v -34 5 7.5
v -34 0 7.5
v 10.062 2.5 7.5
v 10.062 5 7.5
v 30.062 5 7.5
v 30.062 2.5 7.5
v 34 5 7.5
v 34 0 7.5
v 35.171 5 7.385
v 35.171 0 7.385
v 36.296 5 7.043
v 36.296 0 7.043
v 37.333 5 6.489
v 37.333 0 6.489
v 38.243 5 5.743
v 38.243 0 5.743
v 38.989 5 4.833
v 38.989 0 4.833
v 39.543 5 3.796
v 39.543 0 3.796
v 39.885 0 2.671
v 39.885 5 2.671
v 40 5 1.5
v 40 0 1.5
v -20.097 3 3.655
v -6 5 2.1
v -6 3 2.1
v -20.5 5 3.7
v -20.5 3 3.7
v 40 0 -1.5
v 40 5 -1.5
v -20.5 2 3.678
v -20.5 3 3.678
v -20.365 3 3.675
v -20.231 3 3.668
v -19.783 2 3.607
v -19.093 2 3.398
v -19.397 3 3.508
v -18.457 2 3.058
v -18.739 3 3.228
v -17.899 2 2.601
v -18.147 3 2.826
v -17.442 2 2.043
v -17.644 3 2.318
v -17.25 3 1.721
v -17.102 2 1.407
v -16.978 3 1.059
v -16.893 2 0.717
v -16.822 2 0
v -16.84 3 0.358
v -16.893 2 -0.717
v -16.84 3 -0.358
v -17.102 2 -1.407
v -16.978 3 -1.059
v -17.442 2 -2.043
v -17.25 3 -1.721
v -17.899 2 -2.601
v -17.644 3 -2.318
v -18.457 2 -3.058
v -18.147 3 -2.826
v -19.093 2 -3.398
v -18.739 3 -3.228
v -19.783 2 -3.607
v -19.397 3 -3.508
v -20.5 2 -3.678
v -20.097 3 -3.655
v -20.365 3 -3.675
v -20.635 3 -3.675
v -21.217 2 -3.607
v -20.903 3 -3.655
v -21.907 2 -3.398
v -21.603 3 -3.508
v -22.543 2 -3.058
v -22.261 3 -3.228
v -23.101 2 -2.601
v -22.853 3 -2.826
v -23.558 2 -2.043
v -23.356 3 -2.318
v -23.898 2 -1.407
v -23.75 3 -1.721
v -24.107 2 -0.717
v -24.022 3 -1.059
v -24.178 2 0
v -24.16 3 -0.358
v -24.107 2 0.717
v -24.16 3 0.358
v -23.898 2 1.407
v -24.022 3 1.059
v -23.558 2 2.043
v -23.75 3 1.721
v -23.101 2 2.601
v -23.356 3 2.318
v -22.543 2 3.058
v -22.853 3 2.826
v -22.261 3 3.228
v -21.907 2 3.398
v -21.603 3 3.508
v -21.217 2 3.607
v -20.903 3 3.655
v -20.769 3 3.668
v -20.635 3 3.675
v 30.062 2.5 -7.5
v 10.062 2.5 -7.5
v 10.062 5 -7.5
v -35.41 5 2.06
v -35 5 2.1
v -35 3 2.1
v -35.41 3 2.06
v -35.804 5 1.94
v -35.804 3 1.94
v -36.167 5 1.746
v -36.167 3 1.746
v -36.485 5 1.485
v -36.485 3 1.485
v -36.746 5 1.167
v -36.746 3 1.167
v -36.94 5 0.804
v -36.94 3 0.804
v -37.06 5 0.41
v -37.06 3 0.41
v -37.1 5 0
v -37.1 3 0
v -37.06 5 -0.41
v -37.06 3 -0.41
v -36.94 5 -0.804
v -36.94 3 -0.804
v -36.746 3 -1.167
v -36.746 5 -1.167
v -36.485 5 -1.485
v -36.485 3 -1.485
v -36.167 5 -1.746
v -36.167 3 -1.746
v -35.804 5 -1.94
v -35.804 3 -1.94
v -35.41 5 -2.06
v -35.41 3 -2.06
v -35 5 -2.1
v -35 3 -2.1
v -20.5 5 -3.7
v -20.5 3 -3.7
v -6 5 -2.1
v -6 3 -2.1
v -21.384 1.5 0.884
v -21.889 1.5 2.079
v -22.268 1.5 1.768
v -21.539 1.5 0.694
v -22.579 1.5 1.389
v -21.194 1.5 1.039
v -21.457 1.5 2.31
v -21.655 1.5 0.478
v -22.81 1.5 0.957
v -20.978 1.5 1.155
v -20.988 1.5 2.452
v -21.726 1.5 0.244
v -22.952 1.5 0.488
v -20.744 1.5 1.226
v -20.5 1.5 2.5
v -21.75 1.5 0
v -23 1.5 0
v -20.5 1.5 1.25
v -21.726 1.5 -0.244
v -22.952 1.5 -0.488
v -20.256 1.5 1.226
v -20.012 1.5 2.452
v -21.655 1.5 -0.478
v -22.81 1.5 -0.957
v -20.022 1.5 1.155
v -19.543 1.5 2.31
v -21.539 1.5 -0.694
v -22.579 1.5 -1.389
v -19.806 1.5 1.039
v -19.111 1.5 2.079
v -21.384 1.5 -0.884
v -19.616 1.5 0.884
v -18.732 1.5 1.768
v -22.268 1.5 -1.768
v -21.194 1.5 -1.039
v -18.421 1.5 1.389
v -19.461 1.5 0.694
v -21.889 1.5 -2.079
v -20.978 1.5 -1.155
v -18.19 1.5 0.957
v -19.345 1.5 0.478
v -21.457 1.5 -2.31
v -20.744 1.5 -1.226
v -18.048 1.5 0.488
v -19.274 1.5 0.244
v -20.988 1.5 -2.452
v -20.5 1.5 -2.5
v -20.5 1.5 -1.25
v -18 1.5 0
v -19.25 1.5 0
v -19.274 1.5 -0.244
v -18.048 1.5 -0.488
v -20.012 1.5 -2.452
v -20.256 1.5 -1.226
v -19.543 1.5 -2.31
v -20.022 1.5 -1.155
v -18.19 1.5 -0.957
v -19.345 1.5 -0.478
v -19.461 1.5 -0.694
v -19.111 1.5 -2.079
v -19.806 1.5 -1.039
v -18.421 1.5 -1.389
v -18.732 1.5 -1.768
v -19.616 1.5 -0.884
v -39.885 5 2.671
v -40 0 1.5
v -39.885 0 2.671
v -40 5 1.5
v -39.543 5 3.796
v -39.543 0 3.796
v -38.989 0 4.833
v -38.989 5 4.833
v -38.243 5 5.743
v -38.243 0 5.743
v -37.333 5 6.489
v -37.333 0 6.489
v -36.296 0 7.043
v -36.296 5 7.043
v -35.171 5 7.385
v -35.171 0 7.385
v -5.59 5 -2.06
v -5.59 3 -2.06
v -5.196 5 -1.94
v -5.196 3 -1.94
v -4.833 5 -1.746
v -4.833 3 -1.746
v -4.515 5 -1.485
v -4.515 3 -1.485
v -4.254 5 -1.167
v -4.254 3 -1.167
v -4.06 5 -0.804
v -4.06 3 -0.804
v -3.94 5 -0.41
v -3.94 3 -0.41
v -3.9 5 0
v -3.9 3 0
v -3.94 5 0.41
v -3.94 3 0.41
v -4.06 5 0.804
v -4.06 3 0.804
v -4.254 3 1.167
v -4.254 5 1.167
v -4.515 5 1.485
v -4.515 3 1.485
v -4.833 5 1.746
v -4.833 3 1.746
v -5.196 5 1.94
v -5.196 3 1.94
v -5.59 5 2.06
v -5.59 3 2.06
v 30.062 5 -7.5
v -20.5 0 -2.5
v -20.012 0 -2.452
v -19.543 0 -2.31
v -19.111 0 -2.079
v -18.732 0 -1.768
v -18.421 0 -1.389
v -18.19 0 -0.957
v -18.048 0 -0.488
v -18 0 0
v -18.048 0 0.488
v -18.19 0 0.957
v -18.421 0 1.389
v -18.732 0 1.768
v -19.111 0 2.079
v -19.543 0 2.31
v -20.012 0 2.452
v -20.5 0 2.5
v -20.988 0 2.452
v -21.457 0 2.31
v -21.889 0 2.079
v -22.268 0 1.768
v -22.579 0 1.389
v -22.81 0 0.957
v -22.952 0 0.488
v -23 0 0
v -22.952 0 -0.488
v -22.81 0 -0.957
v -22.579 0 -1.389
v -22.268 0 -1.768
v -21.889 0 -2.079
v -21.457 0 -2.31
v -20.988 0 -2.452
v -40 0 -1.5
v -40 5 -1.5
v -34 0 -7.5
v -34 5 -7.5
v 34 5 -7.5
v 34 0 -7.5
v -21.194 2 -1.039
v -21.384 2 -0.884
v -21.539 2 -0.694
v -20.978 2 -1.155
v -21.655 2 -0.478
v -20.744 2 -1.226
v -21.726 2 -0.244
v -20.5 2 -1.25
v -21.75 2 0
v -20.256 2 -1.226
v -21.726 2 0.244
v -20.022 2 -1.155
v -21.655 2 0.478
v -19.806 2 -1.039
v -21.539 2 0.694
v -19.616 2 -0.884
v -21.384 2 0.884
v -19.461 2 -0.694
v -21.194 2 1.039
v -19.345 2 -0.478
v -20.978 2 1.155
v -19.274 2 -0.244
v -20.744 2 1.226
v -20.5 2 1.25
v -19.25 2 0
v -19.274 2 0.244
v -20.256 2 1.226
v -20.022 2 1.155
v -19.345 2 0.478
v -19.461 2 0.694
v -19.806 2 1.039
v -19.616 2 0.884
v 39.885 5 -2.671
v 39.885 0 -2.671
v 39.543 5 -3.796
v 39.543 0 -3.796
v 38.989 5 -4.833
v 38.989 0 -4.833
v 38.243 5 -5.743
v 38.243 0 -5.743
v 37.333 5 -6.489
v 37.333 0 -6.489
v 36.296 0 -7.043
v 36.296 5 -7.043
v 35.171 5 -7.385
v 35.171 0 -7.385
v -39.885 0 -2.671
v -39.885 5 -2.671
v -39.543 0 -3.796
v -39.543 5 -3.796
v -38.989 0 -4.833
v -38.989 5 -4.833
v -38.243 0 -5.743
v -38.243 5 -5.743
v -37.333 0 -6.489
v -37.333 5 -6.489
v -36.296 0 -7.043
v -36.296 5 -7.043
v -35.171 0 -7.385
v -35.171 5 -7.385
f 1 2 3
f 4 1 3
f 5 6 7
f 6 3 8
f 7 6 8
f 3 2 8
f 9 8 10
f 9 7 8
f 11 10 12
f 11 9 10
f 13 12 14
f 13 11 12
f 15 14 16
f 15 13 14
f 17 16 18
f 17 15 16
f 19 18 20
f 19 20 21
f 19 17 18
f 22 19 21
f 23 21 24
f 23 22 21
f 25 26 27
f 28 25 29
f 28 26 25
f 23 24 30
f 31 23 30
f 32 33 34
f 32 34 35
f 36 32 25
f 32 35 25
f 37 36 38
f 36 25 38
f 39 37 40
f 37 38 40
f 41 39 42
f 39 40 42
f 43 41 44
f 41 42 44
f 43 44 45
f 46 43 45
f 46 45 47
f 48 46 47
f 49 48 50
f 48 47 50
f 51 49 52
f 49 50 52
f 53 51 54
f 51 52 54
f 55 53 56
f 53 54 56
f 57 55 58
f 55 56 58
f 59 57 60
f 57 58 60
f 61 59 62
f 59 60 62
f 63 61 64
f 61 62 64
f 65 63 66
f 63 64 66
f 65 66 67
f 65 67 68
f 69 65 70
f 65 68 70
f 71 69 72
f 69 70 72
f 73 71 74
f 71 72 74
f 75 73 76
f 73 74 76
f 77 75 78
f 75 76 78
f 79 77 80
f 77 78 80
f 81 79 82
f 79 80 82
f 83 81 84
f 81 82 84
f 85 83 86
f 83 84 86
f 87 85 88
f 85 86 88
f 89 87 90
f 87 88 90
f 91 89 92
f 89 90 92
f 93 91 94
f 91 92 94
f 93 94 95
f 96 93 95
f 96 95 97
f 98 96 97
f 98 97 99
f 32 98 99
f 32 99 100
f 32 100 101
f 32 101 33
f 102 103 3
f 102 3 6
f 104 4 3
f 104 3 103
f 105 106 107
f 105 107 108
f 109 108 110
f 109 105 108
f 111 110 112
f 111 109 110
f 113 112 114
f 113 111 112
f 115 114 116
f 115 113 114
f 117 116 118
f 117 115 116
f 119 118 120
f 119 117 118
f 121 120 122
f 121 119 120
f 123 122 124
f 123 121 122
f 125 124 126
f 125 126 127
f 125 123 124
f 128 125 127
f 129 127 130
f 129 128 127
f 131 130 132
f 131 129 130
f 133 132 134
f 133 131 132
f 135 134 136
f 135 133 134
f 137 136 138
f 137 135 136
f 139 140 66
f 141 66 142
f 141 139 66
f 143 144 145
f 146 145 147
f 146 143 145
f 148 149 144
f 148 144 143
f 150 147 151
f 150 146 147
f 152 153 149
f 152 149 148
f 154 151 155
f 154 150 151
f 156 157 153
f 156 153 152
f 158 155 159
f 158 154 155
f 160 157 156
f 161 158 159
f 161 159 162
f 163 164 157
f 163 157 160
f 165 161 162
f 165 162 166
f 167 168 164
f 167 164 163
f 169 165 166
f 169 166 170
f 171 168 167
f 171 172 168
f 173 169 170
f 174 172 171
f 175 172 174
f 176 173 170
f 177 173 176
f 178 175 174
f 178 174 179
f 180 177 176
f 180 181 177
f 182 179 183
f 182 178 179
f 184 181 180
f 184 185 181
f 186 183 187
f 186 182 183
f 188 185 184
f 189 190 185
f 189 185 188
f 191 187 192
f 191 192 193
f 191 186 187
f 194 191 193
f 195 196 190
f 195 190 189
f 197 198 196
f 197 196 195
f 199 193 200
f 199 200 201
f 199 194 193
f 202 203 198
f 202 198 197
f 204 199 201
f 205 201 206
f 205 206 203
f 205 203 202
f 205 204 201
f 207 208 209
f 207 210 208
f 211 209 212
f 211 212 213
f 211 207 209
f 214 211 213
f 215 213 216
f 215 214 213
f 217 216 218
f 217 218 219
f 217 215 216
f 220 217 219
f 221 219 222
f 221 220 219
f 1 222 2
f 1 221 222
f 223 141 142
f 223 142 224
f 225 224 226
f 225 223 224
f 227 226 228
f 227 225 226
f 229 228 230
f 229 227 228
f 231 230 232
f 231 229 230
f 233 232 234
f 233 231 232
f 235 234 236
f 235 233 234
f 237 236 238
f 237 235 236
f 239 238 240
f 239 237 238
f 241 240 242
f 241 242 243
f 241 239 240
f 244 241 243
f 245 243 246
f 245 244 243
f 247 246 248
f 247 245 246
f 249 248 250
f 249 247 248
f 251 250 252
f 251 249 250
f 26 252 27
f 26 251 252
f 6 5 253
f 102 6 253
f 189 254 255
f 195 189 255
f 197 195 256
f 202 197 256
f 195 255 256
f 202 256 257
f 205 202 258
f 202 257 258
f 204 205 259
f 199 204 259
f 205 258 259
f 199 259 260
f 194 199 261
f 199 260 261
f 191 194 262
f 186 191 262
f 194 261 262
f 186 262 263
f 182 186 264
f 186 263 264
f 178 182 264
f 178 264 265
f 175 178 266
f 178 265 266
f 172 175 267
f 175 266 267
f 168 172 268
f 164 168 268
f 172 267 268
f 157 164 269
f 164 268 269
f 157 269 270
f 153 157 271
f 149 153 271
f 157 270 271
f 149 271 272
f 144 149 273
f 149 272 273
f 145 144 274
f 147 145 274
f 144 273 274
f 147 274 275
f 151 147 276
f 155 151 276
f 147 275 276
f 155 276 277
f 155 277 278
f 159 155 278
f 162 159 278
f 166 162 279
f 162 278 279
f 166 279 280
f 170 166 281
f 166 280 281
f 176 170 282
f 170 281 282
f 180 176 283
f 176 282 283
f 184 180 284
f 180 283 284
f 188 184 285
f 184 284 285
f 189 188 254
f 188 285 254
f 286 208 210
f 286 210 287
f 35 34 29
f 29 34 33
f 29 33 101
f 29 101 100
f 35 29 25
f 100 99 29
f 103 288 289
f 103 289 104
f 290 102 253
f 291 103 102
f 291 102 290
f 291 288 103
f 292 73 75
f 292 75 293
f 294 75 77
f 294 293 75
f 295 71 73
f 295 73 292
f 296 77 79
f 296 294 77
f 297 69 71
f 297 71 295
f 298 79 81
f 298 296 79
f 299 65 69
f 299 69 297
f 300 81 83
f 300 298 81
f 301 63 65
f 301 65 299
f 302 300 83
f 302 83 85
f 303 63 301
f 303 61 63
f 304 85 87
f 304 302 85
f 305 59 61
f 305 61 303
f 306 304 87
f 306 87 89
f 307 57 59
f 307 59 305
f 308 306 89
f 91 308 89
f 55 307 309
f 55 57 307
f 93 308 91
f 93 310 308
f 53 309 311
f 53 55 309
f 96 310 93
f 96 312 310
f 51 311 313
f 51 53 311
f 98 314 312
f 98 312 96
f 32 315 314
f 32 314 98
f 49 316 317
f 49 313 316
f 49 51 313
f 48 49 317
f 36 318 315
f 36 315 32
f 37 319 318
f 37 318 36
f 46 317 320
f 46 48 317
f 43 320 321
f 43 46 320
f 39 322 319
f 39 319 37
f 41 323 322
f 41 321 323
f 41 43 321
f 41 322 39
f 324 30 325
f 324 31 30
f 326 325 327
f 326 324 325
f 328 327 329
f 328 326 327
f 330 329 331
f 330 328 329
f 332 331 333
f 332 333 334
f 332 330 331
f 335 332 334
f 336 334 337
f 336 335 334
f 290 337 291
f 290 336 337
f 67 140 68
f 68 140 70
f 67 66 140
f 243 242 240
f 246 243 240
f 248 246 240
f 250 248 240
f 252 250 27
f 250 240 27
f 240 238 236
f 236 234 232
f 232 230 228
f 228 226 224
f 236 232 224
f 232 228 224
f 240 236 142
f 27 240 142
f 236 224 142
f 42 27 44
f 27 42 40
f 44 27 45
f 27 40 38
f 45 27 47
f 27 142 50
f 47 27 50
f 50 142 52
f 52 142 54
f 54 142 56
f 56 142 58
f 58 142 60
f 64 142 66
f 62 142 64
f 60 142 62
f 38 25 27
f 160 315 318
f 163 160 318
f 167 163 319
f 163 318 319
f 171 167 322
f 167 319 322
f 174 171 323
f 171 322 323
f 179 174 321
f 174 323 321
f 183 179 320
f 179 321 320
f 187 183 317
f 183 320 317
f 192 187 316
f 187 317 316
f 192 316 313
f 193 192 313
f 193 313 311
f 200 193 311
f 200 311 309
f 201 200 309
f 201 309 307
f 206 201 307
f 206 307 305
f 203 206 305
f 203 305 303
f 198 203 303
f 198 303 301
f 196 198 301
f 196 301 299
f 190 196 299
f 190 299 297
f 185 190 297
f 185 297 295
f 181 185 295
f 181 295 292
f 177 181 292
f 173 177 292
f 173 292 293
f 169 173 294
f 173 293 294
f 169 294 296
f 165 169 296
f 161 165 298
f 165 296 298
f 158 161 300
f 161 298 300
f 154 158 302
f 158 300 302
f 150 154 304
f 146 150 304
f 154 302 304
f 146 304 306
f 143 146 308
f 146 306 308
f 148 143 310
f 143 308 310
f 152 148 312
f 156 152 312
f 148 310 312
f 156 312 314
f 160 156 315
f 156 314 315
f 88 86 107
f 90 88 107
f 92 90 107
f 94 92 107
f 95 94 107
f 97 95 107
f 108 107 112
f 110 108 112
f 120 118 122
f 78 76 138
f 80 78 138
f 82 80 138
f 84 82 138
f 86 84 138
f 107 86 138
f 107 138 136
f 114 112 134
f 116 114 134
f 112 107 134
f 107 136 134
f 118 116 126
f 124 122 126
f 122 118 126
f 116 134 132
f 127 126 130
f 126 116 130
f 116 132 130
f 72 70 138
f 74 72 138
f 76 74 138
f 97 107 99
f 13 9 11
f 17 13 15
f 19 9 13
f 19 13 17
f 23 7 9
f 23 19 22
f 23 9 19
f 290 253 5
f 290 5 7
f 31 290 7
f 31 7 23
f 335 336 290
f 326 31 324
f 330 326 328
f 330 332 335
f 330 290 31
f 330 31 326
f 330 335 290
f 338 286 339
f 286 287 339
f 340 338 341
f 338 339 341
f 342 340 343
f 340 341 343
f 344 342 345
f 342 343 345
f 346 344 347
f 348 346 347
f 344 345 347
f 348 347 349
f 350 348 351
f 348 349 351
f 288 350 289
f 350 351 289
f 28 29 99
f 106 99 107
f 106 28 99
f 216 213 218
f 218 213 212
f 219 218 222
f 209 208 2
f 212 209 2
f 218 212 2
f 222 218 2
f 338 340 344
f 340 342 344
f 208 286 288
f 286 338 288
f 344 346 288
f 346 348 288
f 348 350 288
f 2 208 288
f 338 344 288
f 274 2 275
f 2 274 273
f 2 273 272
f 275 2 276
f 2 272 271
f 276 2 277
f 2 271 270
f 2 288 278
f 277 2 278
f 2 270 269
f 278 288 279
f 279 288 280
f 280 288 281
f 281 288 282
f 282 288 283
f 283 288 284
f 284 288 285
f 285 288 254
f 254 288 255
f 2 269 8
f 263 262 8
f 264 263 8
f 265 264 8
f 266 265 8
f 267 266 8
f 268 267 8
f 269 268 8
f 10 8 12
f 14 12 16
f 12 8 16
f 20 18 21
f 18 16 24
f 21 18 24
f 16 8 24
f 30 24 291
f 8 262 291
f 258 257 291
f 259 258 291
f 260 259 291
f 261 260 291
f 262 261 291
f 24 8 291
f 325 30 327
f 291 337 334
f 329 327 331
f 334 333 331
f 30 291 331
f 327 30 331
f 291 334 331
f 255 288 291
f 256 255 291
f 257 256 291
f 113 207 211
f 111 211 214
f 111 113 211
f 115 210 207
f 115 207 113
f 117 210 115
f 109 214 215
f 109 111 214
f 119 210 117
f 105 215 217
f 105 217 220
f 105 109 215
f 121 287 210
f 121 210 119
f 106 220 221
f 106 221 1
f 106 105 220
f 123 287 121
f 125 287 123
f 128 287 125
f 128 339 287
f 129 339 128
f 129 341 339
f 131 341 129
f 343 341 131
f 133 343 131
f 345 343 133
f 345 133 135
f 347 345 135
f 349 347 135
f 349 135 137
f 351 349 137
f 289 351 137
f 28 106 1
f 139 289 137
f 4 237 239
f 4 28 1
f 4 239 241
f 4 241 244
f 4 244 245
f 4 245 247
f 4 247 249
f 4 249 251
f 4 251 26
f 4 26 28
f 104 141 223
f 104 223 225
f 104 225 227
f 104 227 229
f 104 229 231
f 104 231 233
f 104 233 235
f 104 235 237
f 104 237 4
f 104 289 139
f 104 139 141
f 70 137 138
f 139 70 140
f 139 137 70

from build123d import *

# Parameters (mm, degrees)
SKETCH1_W           = 80
SKETCH1_H           = 15
BOSS_EXTRUDE1_DEPTH = 5
FILLET1_R           = 6
SKETCH3_W           = 20
SKETCH3_H           = 15
CUT_EXTRUDE2_DEPTH  = 2.5
CUT_EXTRUDE3_DEPTH  = 2
SKETCH5_R           = 1.25
CUT_EXTRUDE4_DEPTH  = 41.807474805
SKETCH6_R           = 2.5
CUT_EXTRUDE5_DEPTH  = 1.5
SKETCH7_R           = 3.677678073
CUT_EXTRUDE6_DEPTH  = 1


with BuildPart() as part:
    # Sketch1 → Boss-Extrude1 (new body)
    with BuildSketch(Plane(origin=(0, 0, 0), x_dir=(1, 0, 0), z_dir=(0, 1, 0))):
        Rectangle(SKETCH1_W, SKETCH1_H)
    extrude(amount=BOSS_EXTRUDE1_DEPTH)

    # Fillet1
    fillet1_edges = [part.edges().sort_by_distance(p)[0] for p in [
        (-40, 2.5, -7.5),
        (40, 2.5, -7.5),
        (40, 2.5, 7.5),
        (-40, 2.5, 7.5),
    ]]
    fillet(fillet1_edges, radius=FILLET1_R)

    # Sketch3 → Cut-Extrude2 (cut)
    with BuildSketch(Plane(origin=(0, 5, 0), x_dir=(1, 0, 0), z_dir=(0, 1, 0))):
        with Locations((20.062463618, 0)):
            Rectangle(SKETCH3_W, SKETCH3_H)
    extrude(amount=-CUT_EXTRUDE2_DEPTH, mode=Mode.SUBTRACT)

    # Sketch4 → Cut-Extrude3 (cut)
    with BuildSketch(Plane(origin=(0, 5, 0), x_dir=(1, 0, 0), z_dir=(0, 1, 0))):
        with BuildLine():
            Line((-20.5, 3.7), (-6, 2.1))
            ThreePointArc((-6, 2.1), (-3.9, 0), (-6, -2.1))
            Line((-6, -2.1), (-20.5, -3.7))
            Line((-20.5, -3.7), (-35, -2.1))
            ThreePointArc((-35, -2.1), (-37.1, 0), (-35, 2.1))
            Line((-35, 2.1), (-20.5, 3.7))
        make_face()
    extrude(amount=-CUT_EXTRUDE3_DEPTH, mode=Mode.SUBTRACT)

    # Sketch5 → Cut-Extrude4 (cut, through all)
    with BuildSketch(Plane(origin=(0, 3, 0), x_dir=(1, 0, 0), z_dir=(0, 1, 0))):
        with Locations(Location((-20.5, 0, 0), (0, 0, 270))):
            Circle(SKETCH5_R)
    extrude(amount=-CUT_EXTRUDE4_DEPTH, mode=Mode.SUBTRACT)

    # Sketch6 → Cut-Extrude5 (cut)
    with BuildSketch(Plane(origin=(0, 0, 0), x_dir=(-1, 0, 0), z_dir=(0, -1, 0))):
        with Locations(Location((20.5, 0, 0), (0, 0, 90))):
            Circle(SKETCH6_R)
    extrude(amount=-CUT_EXTRUDE5_DEPTH, mode=Mode.SUBTRACT)

    # Sketch7 → Cut-Extrude6 (cut)
    with BuildSketch(Plane(origin=(0, 3, 0), x_dir=(1, 0, 0), z_dir=(0, 1, 0))):
        with Locations(Location((-20.5, 0, 0), (0, 0, 270))):
            Circle(SKETCH7_R)
    extrude(amount=-CUT_EXTRUDE6_DEPTH, mode=Mode.SUBTRACT)


solid = part.part
